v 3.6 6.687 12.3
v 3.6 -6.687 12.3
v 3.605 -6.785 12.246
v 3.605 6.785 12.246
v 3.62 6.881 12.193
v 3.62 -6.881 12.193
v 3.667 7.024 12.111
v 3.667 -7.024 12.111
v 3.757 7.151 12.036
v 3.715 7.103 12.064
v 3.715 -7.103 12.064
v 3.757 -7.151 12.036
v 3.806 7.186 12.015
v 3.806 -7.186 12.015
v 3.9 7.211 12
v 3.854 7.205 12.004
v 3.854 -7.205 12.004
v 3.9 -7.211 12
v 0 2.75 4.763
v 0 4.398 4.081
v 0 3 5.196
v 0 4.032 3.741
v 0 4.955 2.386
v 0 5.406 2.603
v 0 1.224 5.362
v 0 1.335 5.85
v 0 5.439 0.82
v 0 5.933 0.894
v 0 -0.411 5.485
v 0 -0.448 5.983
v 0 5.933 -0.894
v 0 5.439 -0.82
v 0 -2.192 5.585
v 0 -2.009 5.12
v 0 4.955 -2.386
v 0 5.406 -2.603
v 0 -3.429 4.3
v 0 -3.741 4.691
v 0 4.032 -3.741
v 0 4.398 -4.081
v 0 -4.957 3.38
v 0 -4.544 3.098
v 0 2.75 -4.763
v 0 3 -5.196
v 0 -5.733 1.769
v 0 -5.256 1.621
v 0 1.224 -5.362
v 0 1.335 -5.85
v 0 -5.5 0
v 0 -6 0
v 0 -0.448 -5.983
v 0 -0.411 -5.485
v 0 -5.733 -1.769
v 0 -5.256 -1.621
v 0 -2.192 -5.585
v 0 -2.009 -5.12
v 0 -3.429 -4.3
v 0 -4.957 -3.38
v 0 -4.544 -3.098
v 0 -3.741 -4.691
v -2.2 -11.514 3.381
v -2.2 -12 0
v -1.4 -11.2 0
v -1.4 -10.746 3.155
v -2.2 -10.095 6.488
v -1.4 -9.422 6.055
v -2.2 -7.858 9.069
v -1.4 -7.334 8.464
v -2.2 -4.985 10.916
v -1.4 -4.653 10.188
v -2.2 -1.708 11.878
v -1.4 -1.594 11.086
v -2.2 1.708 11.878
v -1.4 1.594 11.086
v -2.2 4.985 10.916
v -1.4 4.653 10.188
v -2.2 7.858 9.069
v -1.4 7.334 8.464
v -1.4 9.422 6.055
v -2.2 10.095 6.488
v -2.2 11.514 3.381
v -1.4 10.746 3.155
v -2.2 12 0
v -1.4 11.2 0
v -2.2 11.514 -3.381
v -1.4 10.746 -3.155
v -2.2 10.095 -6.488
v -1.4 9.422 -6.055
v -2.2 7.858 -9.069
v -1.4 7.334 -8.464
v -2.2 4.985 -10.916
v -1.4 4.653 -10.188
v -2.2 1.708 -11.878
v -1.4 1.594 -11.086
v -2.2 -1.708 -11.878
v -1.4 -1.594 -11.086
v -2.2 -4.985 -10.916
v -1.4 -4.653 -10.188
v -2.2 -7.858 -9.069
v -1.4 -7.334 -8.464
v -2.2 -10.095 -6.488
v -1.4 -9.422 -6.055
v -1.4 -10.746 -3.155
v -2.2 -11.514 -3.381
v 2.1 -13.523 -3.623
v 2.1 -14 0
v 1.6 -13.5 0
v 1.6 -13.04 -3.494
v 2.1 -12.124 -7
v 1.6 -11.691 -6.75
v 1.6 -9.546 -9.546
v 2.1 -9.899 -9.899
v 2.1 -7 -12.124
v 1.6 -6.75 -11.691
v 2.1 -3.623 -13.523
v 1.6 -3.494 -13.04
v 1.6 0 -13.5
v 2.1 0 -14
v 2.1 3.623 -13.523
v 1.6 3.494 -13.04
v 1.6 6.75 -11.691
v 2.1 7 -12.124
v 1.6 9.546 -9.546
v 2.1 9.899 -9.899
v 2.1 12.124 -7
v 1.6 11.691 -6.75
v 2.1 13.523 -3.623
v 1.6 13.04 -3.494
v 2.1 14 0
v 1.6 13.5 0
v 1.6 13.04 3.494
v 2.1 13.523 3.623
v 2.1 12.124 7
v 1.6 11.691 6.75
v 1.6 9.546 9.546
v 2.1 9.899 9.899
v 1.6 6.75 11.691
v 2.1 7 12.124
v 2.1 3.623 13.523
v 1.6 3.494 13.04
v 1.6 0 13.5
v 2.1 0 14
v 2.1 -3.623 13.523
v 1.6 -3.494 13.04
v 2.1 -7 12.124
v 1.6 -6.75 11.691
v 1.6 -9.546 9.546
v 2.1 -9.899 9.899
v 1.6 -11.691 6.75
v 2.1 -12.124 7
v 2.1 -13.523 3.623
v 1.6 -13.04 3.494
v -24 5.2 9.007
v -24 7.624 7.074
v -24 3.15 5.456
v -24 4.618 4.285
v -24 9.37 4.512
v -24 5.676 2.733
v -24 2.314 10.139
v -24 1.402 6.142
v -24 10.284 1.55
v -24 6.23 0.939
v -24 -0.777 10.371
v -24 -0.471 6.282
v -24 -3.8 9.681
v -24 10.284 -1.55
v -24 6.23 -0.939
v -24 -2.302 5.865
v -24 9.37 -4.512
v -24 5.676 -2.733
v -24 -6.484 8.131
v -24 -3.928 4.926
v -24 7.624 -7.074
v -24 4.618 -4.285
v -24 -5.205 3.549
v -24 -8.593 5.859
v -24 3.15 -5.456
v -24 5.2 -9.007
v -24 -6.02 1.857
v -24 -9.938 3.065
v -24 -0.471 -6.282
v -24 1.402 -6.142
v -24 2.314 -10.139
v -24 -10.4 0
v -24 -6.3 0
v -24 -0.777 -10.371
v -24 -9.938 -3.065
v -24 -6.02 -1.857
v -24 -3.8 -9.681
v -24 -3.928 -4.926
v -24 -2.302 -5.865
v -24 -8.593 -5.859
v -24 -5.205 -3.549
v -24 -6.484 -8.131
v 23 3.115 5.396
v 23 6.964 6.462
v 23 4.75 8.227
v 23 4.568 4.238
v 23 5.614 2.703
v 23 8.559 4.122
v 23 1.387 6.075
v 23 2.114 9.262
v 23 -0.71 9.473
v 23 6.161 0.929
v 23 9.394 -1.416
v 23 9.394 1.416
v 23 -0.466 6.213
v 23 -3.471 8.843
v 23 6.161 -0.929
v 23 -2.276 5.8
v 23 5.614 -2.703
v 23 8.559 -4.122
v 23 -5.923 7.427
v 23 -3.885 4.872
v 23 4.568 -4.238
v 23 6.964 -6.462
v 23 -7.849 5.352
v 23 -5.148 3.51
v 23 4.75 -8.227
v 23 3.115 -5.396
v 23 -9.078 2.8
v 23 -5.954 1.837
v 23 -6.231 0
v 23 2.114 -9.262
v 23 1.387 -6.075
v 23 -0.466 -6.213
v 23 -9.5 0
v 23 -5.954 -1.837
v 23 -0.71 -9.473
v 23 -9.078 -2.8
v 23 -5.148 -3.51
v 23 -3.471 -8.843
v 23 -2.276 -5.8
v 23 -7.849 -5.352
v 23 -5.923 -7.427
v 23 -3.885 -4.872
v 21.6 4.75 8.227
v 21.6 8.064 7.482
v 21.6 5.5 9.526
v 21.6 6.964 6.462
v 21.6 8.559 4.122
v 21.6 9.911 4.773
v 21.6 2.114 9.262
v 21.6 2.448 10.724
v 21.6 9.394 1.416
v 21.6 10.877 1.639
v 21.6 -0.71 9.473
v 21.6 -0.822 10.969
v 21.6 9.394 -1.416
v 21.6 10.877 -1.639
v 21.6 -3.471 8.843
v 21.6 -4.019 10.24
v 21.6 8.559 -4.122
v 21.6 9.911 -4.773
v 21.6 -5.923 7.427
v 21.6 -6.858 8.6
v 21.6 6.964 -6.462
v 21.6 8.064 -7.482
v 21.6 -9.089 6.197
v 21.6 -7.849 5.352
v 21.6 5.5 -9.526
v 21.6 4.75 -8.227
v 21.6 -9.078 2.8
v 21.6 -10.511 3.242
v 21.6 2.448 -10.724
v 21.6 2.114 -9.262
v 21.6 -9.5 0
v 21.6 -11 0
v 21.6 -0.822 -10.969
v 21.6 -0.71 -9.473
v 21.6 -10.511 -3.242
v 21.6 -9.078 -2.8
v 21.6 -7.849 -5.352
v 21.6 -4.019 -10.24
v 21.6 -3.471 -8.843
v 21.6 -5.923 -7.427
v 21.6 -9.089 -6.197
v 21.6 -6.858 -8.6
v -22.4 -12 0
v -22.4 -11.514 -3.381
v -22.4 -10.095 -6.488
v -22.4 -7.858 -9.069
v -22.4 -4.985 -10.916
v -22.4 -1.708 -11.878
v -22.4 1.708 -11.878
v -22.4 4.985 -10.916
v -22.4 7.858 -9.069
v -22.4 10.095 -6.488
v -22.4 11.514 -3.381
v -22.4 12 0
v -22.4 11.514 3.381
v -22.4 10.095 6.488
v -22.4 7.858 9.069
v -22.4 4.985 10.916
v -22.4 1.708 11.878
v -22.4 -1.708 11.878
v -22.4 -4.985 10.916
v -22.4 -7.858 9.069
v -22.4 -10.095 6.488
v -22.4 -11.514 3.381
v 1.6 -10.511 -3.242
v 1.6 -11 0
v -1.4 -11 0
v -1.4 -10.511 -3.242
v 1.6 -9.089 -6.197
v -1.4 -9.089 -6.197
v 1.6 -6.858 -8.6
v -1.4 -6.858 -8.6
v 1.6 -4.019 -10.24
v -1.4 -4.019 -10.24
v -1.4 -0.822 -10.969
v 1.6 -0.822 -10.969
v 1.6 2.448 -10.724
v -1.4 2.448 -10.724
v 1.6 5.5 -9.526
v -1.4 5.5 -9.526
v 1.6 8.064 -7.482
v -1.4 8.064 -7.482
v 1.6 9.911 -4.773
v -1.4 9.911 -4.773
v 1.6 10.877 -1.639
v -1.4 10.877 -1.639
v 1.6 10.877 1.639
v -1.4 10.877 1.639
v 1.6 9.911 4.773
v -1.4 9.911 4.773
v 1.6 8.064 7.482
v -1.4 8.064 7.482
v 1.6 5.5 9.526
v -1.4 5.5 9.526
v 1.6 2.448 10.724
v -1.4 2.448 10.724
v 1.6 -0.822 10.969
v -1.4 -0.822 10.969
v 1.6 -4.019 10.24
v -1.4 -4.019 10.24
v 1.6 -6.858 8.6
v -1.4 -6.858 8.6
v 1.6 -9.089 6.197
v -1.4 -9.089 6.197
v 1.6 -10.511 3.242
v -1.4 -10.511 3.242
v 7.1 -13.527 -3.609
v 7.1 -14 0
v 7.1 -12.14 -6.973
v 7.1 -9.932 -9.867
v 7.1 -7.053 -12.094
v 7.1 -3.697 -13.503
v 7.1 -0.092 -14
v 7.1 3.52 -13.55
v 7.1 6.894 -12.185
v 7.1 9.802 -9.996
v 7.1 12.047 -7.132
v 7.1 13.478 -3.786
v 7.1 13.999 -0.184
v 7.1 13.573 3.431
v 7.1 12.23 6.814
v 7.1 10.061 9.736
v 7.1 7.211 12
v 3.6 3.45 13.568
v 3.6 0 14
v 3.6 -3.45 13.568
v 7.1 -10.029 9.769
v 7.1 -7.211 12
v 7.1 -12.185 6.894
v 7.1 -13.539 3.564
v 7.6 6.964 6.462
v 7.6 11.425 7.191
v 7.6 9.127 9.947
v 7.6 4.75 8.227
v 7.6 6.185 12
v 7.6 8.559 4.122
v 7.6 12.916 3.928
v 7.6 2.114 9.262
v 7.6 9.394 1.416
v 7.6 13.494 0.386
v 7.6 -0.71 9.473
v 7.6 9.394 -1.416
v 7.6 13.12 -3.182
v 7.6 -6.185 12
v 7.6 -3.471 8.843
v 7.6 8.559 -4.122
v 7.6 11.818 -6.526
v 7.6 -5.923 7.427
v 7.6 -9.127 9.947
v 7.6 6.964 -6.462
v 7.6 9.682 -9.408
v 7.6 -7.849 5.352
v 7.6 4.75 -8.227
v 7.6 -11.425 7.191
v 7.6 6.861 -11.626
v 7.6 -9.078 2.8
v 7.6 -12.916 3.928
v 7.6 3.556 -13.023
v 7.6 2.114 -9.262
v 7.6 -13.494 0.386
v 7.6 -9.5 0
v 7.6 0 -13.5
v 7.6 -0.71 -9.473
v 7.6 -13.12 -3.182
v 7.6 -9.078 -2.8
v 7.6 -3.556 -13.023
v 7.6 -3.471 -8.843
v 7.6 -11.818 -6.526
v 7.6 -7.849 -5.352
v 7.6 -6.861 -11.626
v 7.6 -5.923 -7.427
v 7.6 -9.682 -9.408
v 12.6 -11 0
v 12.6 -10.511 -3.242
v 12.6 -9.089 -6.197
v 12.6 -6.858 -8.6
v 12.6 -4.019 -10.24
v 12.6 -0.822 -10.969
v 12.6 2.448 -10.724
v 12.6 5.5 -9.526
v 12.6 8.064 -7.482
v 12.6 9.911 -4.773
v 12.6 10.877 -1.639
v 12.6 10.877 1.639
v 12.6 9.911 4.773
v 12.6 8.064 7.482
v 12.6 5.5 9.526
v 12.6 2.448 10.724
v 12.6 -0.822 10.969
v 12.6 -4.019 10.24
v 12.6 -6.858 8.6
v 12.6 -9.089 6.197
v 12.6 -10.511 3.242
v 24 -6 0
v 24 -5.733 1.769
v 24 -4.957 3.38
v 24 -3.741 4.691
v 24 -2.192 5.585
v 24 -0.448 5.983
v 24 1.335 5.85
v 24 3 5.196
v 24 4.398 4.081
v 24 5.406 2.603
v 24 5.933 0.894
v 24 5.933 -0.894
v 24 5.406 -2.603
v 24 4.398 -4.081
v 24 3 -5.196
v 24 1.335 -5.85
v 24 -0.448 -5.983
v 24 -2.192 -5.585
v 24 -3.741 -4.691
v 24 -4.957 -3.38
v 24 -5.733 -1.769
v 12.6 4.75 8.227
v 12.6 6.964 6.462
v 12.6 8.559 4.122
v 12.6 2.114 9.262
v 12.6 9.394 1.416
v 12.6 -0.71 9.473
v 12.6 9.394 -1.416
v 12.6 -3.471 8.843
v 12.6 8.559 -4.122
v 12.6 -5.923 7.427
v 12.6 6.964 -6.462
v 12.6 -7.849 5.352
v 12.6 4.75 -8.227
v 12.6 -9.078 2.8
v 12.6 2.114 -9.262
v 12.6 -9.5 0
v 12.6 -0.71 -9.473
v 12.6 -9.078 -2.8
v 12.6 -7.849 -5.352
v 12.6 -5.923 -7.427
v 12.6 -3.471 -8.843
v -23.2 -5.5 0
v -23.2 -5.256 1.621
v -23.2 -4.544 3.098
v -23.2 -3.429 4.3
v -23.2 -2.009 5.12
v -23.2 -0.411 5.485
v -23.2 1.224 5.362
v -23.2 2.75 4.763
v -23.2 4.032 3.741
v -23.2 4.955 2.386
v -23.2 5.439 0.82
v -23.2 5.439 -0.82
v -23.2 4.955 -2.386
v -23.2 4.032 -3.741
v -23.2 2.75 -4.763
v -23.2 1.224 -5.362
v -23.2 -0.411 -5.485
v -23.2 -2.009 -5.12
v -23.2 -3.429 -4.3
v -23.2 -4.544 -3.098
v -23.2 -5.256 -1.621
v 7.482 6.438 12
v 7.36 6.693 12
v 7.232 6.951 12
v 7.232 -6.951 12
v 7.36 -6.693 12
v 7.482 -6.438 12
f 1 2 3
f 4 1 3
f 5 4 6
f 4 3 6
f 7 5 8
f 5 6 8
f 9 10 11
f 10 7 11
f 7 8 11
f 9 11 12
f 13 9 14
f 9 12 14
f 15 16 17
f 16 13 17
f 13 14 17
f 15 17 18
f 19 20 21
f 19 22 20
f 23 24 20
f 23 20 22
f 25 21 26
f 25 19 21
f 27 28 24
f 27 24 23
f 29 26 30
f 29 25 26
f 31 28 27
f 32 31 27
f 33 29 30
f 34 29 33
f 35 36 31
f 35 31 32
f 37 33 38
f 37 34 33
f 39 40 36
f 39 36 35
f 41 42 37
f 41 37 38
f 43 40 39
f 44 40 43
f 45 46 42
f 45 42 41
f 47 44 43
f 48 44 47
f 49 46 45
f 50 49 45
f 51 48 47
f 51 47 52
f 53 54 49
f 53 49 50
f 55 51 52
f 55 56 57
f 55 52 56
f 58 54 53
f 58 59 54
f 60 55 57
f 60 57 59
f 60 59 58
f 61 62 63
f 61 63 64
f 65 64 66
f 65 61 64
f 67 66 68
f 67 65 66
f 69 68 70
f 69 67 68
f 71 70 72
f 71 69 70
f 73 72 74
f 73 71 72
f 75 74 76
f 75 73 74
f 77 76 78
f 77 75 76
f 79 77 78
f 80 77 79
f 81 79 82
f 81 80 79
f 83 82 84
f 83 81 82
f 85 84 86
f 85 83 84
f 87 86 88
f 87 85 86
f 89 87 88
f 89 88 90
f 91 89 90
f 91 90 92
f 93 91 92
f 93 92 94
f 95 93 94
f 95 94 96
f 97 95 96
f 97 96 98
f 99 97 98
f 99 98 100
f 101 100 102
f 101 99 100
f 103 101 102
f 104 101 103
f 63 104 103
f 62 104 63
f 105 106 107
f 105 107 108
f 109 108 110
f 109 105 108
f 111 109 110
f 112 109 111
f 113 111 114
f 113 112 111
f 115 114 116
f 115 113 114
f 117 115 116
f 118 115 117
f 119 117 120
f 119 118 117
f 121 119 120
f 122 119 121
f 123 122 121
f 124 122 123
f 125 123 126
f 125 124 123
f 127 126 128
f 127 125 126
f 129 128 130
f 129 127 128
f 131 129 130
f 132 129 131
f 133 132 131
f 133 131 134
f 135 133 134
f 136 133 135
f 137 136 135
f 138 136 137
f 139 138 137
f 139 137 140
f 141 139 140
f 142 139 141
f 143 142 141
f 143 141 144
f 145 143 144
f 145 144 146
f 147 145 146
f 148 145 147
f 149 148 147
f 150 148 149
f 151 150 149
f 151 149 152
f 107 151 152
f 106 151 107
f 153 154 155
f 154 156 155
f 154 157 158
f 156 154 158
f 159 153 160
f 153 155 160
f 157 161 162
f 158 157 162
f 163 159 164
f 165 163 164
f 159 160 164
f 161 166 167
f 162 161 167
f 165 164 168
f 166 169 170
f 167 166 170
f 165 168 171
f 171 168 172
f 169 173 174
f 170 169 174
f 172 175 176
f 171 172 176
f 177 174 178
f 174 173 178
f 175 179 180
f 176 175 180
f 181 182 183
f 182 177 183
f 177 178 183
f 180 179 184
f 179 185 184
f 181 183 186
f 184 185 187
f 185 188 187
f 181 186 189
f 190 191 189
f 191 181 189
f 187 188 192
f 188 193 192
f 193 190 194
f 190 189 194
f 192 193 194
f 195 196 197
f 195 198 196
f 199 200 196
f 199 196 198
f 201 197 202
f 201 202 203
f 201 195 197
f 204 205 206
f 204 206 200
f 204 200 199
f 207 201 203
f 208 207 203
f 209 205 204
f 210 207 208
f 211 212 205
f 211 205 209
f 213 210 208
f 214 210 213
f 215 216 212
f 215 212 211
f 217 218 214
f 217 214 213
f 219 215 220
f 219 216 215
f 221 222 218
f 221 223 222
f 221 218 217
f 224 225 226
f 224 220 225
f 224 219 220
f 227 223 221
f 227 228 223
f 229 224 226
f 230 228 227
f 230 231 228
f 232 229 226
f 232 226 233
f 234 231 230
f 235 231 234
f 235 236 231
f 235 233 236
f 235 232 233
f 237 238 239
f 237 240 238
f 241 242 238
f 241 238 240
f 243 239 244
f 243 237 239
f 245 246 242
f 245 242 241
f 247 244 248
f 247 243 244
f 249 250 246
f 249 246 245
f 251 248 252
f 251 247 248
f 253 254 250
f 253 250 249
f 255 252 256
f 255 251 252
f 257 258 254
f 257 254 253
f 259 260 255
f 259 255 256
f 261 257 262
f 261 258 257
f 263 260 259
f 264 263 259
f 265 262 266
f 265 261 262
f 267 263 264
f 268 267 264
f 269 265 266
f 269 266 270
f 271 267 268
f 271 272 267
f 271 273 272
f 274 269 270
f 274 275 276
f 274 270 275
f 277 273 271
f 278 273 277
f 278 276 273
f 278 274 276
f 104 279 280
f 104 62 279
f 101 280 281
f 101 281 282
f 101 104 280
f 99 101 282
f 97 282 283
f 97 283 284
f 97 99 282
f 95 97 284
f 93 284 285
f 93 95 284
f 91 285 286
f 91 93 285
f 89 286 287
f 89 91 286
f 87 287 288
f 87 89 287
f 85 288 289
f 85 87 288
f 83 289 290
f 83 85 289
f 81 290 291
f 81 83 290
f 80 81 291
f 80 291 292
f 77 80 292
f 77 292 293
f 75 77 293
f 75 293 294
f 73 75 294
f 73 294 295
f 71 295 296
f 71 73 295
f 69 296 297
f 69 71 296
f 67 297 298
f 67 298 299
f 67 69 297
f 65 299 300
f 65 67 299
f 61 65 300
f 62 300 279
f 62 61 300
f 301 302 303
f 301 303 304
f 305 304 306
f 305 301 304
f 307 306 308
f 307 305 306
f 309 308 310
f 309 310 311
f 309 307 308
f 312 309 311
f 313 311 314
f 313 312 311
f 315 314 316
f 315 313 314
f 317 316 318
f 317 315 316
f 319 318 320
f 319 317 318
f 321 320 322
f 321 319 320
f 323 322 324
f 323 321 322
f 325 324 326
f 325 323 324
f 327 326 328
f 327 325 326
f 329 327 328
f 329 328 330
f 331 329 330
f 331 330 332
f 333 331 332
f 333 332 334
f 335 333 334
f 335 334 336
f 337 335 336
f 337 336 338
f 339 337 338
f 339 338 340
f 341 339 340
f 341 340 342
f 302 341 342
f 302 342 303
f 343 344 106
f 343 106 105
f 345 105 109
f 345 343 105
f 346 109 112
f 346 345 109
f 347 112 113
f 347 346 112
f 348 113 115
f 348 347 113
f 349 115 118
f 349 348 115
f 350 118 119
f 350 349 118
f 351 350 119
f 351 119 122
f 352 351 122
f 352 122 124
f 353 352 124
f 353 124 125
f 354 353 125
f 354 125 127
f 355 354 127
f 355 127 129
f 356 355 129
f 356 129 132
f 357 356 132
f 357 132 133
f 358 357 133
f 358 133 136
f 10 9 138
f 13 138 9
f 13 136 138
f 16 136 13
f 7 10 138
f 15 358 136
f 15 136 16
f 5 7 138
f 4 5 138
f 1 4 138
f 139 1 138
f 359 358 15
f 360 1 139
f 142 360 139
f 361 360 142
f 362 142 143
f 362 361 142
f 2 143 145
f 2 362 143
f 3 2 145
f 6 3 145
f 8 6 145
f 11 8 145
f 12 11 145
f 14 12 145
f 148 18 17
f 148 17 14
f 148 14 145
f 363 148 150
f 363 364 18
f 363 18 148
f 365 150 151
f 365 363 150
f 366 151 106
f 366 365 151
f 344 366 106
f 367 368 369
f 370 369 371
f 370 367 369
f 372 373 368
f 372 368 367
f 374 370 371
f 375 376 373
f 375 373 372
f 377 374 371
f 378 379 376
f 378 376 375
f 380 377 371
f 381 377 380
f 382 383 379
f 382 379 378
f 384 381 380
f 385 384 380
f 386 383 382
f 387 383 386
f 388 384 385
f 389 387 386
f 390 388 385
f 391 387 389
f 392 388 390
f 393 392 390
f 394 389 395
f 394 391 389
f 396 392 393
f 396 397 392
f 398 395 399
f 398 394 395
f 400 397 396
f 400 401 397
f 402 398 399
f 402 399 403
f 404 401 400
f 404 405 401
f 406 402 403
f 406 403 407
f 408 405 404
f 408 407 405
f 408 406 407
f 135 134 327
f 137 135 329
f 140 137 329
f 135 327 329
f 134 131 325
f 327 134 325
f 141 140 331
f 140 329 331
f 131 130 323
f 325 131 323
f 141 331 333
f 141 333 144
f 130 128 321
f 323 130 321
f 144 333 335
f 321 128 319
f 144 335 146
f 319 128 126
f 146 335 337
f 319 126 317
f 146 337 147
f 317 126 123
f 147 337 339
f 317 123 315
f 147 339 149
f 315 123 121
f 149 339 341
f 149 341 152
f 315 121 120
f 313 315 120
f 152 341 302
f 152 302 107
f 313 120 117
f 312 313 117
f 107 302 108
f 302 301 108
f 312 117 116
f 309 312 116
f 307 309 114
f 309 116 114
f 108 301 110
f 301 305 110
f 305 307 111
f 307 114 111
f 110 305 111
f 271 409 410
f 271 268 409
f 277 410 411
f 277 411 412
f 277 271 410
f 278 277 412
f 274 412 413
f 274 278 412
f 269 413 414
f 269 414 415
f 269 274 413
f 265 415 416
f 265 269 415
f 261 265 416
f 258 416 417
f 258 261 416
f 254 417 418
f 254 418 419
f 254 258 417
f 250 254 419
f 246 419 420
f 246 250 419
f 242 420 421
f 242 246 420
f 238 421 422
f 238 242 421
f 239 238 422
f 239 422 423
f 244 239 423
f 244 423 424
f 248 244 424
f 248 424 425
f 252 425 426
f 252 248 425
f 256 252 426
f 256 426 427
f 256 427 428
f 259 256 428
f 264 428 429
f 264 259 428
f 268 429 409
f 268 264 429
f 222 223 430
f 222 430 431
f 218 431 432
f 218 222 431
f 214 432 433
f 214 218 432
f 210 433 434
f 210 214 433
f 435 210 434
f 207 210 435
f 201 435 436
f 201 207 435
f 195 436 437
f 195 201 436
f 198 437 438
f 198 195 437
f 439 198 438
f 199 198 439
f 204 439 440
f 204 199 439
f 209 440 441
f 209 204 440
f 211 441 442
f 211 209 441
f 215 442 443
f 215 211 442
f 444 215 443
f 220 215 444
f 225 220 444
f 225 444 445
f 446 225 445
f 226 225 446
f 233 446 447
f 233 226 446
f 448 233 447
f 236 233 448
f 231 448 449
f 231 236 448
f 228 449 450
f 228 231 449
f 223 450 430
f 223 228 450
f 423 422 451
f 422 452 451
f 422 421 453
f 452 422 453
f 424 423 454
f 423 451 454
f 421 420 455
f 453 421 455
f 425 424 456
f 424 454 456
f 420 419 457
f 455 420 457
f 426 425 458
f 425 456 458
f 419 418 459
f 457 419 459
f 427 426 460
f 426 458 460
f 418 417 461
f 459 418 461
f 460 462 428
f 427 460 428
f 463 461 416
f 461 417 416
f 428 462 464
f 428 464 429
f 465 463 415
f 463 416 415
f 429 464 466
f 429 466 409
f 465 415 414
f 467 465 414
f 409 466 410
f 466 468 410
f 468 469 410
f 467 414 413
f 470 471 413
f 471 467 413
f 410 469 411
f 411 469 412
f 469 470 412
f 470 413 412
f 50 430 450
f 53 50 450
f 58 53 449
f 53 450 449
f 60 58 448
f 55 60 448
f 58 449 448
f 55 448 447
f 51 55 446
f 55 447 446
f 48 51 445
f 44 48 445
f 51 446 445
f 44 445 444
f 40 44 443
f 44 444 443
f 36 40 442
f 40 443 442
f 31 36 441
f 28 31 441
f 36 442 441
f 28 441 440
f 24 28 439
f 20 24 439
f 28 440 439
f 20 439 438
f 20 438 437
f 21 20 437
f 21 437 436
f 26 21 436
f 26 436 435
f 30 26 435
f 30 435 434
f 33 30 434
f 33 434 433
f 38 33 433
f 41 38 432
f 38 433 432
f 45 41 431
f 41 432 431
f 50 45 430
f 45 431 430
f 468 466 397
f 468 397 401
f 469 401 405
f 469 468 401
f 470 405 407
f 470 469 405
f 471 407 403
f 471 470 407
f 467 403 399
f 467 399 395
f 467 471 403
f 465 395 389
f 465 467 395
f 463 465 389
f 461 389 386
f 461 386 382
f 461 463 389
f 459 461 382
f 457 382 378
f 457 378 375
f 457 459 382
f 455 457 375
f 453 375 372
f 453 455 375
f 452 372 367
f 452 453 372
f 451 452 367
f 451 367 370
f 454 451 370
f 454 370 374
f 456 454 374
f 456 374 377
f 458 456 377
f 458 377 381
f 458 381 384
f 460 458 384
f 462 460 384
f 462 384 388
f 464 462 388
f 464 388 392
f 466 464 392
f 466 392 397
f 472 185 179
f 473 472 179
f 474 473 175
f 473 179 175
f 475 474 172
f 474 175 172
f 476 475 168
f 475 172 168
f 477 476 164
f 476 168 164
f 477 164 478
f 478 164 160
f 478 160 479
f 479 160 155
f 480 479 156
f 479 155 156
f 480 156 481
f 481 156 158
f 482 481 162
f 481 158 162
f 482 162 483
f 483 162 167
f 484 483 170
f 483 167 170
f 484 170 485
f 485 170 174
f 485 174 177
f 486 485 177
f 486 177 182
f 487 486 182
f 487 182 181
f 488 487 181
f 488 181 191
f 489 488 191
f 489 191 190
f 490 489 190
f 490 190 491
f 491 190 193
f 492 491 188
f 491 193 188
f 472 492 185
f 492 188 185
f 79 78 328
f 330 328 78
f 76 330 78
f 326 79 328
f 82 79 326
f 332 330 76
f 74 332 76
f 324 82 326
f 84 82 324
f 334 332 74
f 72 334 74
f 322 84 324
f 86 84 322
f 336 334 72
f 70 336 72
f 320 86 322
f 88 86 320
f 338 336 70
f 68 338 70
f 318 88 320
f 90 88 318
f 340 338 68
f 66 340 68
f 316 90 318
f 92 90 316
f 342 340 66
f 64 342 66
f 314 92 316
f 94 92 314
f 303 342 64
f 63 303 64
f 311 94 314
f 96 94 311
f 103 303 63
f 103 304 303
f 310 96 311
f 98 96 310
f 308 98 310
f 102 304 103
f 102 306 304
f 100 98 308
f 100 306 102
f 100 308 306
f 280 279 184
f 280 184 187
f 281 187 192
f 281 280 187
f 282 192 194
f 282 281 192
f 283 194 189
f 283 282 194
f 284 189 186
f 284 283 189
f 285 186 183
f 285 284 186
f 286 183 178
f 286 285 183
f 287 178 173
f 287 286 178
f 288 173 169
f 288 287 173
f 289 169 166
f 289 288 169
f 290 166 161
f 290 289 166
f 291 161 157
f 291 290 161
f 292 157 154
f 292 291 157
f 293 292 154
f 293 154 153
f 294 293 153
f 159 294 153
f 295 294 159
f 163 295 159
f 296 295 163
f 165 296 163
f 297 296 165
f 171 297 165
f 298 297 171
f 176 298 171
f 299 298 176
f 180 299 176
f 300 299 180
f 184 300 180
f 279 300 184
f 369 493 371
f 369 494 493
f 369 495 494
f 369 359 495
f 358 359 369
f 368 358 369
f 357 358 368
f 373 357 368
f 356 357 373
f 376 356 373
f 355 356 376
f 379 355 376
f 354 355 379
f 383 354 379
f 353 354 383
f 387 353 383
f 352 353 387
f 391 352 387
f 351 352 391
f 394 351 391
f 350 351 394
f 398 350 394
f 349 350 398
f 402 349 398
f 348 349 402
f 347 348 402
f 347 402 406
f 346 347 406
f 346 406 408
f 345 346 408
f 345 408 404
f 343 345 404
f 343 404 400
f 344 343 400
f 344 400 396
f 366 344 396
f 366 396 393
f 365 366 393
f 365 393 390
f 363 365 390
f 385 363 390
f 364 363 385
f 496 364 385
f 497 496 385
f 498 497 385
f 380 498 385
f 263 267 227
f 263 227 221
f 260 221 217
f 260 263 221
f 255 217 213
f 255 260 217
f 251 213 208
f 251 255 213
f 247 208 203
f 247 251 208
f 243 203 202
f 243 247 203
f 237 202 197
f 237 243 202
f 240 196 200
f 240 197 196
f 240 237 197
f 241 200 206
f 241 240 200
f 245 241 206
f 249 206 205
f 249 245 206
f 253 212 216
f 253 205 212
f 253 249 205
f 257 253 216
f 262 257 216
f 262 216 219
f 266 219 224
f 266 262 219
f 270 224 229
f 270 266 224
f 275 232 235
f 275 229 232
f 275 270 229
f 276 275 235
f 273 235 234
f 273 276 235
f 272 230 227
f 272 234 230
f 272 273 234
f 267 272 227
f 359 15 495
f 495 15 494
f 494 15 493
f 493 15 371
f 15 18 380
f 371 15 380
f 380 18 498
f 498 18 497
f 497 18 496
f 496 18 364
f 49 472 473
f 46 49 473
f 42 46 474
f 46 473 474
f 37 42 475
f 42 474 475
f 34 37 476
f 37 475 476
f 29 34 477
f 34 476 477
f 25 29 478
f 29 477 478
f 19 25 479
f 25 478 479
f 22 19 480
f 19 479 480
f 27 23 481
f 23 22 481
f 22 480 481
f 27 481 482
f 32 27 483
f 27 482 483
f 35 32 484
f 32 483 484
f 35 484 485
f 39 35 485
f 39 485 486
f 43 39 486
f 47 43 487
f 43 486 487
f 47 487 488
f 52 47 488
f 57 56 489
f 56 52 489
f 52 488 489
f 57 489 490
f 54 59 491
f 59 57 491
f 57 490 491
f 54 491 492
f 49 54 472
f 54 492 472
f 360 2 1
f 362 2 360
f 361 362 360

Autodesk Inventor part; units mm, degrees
ref_plane "YZ Plane" through (0, 0, 0) normal (1, 0, 0) x (0, 1, 0)
ref_plane "XZ Plane" through (0, 0, 0) normal (0, 1, 0) x (-1, 0, 0)
ref_plane "XY Plane" through (0, 0, 0) normal (0, 0, 1) x (1, 0, 0)
sketch "Эскиз1" plane through (0, 0, 0) normal (0, 0, 1) x (1, 0, 0)
  line L0 (-24, 0) -> (24, 0)
  line L1 (0, -5.5) -> (-23.2, -5.5)
  line L2 (-24, -6.3) -> (-24, -10.4)
  line L3 (0, -5.5) -> (0, -6)
  line L4 (0, -6) -> (24, -6)
  line L5 (-23.2, -5.5) -> (-24, -6.3)
  line L6 (-22.4, -12) -> (-2.2, -12)
  line L7 (-22.4, -12) -> (-24, -10.4)
  line L8 (-1.4, -11.2) -> (-1.4, -11)
  line L9 (-1.4, -11) -> (1.6, -11)
  line L10 (-2.2, -12) -> (-1.4, -11.2)
  line L11 (1.6, -11) -> (1.6, -13.5)
  line L12 (2.1, -14) -> (7.1, -14)
  line L13 (7.6, -13.5) -> (7.6, -9.5)
  line L14 (7.6, -9.5) -> (12.6, -9.5)
  line L15 (2.1, -14) -> (1.6, -13.5)
  line L16 (7.1, -14) -> (7.6, -13.5)
  line L17 (12.6, -9.5) -> (12.6, -11)
  line L18 (12.6, -11) -> (21.6, -11)
  line L19 (21.6, -11) -> (21.6, -9.5)
  line L20 (24, -6) -> (23, -6.2309)
  line L21 (23, -6.2309) -> (23, -9.5)
  line L22 (23, -9.5) -> (21.6, -9.5)
  point P0 (0, 0)
  point P1 (0, 0)
  point P2 (-24, -5.5)
  point P3 (-24, -12)
  point P4 (-1.4, -12)
  point P5 (1.6, -14)
  point P6 (7.6, -14)
  dimension "d0" = 48
  dimension "d24" = 12
  dimension "d25" = 11
  dimension "d26" = 24
  dimension "d27" = 0.8
  dimension "d28" = 45
  dimension "d29" = 24
  dimension "d30" = 1.6
  dimension "d31" = 45
  dimension "d32" = 22
  dimension "d33" = 0.8
  dimension "d34" = 45
  dimension "d35" = 3
  dimension "d36" = 24
  dimension "d37" = 0.5
  dimension "d38" = 45
  dimension "d39" = 0.5
  dimension "d40" = 45
  dimension "d41" = 19
  dimension "d42" = 6
  dimension "d43" = 5
  dimension "d44" = 22
  dimension "d47" = 13
  dimension "d49" = 14
  dimension "d50" = 19
  dimension "d51" = 1
  dimension "d52" = 28
revolve "Вращение1" add sketch "Эскиз1" angle 360 about axis through (-24, 0, 0) along (1, 0, 0)
sketch "Эскиз2" plane through (0, 0, 0) normal (0, 1, 0) x (-1, 0, 0)
  line L0 (-1.6, -13.5) -> (-1.6, 13.5) projected
  line L1 (-7.1, 14) -> (-2.1, 14) projected
  line L2 (-7.6, 13.5) -> (-7.1, 14) projected
  line L3 (-7.6, -13.5) -> (-7.6, 13.5) projected
  line L4 (-2.1, 14) -> (-1.6, 13.5) projected
  line L5 (-3.6, 14) -> (-3.6, 12)
  line L6 (-3.6, 12) -> (-7.6, 12)
  line L7 (2.2, 12) -> (22.4, 12) projected
  point P0 (0, 0)
  dimension "d54" = 2
extrude "Выдавливание1" cut sketch "Эскиз2" along normal through all both and the other way through all
fillet "Сопряжение1" radius 0.3 1 edges at (3.6, 0, 12)
thread "Резьба1" size "M22x1.5" class "6g" standard "ISO Metric profile" full length
equation "\"d39\" = d37"
equation "\"d40\" = d38"
properties part number "411. Штуцер гибкого вала"
